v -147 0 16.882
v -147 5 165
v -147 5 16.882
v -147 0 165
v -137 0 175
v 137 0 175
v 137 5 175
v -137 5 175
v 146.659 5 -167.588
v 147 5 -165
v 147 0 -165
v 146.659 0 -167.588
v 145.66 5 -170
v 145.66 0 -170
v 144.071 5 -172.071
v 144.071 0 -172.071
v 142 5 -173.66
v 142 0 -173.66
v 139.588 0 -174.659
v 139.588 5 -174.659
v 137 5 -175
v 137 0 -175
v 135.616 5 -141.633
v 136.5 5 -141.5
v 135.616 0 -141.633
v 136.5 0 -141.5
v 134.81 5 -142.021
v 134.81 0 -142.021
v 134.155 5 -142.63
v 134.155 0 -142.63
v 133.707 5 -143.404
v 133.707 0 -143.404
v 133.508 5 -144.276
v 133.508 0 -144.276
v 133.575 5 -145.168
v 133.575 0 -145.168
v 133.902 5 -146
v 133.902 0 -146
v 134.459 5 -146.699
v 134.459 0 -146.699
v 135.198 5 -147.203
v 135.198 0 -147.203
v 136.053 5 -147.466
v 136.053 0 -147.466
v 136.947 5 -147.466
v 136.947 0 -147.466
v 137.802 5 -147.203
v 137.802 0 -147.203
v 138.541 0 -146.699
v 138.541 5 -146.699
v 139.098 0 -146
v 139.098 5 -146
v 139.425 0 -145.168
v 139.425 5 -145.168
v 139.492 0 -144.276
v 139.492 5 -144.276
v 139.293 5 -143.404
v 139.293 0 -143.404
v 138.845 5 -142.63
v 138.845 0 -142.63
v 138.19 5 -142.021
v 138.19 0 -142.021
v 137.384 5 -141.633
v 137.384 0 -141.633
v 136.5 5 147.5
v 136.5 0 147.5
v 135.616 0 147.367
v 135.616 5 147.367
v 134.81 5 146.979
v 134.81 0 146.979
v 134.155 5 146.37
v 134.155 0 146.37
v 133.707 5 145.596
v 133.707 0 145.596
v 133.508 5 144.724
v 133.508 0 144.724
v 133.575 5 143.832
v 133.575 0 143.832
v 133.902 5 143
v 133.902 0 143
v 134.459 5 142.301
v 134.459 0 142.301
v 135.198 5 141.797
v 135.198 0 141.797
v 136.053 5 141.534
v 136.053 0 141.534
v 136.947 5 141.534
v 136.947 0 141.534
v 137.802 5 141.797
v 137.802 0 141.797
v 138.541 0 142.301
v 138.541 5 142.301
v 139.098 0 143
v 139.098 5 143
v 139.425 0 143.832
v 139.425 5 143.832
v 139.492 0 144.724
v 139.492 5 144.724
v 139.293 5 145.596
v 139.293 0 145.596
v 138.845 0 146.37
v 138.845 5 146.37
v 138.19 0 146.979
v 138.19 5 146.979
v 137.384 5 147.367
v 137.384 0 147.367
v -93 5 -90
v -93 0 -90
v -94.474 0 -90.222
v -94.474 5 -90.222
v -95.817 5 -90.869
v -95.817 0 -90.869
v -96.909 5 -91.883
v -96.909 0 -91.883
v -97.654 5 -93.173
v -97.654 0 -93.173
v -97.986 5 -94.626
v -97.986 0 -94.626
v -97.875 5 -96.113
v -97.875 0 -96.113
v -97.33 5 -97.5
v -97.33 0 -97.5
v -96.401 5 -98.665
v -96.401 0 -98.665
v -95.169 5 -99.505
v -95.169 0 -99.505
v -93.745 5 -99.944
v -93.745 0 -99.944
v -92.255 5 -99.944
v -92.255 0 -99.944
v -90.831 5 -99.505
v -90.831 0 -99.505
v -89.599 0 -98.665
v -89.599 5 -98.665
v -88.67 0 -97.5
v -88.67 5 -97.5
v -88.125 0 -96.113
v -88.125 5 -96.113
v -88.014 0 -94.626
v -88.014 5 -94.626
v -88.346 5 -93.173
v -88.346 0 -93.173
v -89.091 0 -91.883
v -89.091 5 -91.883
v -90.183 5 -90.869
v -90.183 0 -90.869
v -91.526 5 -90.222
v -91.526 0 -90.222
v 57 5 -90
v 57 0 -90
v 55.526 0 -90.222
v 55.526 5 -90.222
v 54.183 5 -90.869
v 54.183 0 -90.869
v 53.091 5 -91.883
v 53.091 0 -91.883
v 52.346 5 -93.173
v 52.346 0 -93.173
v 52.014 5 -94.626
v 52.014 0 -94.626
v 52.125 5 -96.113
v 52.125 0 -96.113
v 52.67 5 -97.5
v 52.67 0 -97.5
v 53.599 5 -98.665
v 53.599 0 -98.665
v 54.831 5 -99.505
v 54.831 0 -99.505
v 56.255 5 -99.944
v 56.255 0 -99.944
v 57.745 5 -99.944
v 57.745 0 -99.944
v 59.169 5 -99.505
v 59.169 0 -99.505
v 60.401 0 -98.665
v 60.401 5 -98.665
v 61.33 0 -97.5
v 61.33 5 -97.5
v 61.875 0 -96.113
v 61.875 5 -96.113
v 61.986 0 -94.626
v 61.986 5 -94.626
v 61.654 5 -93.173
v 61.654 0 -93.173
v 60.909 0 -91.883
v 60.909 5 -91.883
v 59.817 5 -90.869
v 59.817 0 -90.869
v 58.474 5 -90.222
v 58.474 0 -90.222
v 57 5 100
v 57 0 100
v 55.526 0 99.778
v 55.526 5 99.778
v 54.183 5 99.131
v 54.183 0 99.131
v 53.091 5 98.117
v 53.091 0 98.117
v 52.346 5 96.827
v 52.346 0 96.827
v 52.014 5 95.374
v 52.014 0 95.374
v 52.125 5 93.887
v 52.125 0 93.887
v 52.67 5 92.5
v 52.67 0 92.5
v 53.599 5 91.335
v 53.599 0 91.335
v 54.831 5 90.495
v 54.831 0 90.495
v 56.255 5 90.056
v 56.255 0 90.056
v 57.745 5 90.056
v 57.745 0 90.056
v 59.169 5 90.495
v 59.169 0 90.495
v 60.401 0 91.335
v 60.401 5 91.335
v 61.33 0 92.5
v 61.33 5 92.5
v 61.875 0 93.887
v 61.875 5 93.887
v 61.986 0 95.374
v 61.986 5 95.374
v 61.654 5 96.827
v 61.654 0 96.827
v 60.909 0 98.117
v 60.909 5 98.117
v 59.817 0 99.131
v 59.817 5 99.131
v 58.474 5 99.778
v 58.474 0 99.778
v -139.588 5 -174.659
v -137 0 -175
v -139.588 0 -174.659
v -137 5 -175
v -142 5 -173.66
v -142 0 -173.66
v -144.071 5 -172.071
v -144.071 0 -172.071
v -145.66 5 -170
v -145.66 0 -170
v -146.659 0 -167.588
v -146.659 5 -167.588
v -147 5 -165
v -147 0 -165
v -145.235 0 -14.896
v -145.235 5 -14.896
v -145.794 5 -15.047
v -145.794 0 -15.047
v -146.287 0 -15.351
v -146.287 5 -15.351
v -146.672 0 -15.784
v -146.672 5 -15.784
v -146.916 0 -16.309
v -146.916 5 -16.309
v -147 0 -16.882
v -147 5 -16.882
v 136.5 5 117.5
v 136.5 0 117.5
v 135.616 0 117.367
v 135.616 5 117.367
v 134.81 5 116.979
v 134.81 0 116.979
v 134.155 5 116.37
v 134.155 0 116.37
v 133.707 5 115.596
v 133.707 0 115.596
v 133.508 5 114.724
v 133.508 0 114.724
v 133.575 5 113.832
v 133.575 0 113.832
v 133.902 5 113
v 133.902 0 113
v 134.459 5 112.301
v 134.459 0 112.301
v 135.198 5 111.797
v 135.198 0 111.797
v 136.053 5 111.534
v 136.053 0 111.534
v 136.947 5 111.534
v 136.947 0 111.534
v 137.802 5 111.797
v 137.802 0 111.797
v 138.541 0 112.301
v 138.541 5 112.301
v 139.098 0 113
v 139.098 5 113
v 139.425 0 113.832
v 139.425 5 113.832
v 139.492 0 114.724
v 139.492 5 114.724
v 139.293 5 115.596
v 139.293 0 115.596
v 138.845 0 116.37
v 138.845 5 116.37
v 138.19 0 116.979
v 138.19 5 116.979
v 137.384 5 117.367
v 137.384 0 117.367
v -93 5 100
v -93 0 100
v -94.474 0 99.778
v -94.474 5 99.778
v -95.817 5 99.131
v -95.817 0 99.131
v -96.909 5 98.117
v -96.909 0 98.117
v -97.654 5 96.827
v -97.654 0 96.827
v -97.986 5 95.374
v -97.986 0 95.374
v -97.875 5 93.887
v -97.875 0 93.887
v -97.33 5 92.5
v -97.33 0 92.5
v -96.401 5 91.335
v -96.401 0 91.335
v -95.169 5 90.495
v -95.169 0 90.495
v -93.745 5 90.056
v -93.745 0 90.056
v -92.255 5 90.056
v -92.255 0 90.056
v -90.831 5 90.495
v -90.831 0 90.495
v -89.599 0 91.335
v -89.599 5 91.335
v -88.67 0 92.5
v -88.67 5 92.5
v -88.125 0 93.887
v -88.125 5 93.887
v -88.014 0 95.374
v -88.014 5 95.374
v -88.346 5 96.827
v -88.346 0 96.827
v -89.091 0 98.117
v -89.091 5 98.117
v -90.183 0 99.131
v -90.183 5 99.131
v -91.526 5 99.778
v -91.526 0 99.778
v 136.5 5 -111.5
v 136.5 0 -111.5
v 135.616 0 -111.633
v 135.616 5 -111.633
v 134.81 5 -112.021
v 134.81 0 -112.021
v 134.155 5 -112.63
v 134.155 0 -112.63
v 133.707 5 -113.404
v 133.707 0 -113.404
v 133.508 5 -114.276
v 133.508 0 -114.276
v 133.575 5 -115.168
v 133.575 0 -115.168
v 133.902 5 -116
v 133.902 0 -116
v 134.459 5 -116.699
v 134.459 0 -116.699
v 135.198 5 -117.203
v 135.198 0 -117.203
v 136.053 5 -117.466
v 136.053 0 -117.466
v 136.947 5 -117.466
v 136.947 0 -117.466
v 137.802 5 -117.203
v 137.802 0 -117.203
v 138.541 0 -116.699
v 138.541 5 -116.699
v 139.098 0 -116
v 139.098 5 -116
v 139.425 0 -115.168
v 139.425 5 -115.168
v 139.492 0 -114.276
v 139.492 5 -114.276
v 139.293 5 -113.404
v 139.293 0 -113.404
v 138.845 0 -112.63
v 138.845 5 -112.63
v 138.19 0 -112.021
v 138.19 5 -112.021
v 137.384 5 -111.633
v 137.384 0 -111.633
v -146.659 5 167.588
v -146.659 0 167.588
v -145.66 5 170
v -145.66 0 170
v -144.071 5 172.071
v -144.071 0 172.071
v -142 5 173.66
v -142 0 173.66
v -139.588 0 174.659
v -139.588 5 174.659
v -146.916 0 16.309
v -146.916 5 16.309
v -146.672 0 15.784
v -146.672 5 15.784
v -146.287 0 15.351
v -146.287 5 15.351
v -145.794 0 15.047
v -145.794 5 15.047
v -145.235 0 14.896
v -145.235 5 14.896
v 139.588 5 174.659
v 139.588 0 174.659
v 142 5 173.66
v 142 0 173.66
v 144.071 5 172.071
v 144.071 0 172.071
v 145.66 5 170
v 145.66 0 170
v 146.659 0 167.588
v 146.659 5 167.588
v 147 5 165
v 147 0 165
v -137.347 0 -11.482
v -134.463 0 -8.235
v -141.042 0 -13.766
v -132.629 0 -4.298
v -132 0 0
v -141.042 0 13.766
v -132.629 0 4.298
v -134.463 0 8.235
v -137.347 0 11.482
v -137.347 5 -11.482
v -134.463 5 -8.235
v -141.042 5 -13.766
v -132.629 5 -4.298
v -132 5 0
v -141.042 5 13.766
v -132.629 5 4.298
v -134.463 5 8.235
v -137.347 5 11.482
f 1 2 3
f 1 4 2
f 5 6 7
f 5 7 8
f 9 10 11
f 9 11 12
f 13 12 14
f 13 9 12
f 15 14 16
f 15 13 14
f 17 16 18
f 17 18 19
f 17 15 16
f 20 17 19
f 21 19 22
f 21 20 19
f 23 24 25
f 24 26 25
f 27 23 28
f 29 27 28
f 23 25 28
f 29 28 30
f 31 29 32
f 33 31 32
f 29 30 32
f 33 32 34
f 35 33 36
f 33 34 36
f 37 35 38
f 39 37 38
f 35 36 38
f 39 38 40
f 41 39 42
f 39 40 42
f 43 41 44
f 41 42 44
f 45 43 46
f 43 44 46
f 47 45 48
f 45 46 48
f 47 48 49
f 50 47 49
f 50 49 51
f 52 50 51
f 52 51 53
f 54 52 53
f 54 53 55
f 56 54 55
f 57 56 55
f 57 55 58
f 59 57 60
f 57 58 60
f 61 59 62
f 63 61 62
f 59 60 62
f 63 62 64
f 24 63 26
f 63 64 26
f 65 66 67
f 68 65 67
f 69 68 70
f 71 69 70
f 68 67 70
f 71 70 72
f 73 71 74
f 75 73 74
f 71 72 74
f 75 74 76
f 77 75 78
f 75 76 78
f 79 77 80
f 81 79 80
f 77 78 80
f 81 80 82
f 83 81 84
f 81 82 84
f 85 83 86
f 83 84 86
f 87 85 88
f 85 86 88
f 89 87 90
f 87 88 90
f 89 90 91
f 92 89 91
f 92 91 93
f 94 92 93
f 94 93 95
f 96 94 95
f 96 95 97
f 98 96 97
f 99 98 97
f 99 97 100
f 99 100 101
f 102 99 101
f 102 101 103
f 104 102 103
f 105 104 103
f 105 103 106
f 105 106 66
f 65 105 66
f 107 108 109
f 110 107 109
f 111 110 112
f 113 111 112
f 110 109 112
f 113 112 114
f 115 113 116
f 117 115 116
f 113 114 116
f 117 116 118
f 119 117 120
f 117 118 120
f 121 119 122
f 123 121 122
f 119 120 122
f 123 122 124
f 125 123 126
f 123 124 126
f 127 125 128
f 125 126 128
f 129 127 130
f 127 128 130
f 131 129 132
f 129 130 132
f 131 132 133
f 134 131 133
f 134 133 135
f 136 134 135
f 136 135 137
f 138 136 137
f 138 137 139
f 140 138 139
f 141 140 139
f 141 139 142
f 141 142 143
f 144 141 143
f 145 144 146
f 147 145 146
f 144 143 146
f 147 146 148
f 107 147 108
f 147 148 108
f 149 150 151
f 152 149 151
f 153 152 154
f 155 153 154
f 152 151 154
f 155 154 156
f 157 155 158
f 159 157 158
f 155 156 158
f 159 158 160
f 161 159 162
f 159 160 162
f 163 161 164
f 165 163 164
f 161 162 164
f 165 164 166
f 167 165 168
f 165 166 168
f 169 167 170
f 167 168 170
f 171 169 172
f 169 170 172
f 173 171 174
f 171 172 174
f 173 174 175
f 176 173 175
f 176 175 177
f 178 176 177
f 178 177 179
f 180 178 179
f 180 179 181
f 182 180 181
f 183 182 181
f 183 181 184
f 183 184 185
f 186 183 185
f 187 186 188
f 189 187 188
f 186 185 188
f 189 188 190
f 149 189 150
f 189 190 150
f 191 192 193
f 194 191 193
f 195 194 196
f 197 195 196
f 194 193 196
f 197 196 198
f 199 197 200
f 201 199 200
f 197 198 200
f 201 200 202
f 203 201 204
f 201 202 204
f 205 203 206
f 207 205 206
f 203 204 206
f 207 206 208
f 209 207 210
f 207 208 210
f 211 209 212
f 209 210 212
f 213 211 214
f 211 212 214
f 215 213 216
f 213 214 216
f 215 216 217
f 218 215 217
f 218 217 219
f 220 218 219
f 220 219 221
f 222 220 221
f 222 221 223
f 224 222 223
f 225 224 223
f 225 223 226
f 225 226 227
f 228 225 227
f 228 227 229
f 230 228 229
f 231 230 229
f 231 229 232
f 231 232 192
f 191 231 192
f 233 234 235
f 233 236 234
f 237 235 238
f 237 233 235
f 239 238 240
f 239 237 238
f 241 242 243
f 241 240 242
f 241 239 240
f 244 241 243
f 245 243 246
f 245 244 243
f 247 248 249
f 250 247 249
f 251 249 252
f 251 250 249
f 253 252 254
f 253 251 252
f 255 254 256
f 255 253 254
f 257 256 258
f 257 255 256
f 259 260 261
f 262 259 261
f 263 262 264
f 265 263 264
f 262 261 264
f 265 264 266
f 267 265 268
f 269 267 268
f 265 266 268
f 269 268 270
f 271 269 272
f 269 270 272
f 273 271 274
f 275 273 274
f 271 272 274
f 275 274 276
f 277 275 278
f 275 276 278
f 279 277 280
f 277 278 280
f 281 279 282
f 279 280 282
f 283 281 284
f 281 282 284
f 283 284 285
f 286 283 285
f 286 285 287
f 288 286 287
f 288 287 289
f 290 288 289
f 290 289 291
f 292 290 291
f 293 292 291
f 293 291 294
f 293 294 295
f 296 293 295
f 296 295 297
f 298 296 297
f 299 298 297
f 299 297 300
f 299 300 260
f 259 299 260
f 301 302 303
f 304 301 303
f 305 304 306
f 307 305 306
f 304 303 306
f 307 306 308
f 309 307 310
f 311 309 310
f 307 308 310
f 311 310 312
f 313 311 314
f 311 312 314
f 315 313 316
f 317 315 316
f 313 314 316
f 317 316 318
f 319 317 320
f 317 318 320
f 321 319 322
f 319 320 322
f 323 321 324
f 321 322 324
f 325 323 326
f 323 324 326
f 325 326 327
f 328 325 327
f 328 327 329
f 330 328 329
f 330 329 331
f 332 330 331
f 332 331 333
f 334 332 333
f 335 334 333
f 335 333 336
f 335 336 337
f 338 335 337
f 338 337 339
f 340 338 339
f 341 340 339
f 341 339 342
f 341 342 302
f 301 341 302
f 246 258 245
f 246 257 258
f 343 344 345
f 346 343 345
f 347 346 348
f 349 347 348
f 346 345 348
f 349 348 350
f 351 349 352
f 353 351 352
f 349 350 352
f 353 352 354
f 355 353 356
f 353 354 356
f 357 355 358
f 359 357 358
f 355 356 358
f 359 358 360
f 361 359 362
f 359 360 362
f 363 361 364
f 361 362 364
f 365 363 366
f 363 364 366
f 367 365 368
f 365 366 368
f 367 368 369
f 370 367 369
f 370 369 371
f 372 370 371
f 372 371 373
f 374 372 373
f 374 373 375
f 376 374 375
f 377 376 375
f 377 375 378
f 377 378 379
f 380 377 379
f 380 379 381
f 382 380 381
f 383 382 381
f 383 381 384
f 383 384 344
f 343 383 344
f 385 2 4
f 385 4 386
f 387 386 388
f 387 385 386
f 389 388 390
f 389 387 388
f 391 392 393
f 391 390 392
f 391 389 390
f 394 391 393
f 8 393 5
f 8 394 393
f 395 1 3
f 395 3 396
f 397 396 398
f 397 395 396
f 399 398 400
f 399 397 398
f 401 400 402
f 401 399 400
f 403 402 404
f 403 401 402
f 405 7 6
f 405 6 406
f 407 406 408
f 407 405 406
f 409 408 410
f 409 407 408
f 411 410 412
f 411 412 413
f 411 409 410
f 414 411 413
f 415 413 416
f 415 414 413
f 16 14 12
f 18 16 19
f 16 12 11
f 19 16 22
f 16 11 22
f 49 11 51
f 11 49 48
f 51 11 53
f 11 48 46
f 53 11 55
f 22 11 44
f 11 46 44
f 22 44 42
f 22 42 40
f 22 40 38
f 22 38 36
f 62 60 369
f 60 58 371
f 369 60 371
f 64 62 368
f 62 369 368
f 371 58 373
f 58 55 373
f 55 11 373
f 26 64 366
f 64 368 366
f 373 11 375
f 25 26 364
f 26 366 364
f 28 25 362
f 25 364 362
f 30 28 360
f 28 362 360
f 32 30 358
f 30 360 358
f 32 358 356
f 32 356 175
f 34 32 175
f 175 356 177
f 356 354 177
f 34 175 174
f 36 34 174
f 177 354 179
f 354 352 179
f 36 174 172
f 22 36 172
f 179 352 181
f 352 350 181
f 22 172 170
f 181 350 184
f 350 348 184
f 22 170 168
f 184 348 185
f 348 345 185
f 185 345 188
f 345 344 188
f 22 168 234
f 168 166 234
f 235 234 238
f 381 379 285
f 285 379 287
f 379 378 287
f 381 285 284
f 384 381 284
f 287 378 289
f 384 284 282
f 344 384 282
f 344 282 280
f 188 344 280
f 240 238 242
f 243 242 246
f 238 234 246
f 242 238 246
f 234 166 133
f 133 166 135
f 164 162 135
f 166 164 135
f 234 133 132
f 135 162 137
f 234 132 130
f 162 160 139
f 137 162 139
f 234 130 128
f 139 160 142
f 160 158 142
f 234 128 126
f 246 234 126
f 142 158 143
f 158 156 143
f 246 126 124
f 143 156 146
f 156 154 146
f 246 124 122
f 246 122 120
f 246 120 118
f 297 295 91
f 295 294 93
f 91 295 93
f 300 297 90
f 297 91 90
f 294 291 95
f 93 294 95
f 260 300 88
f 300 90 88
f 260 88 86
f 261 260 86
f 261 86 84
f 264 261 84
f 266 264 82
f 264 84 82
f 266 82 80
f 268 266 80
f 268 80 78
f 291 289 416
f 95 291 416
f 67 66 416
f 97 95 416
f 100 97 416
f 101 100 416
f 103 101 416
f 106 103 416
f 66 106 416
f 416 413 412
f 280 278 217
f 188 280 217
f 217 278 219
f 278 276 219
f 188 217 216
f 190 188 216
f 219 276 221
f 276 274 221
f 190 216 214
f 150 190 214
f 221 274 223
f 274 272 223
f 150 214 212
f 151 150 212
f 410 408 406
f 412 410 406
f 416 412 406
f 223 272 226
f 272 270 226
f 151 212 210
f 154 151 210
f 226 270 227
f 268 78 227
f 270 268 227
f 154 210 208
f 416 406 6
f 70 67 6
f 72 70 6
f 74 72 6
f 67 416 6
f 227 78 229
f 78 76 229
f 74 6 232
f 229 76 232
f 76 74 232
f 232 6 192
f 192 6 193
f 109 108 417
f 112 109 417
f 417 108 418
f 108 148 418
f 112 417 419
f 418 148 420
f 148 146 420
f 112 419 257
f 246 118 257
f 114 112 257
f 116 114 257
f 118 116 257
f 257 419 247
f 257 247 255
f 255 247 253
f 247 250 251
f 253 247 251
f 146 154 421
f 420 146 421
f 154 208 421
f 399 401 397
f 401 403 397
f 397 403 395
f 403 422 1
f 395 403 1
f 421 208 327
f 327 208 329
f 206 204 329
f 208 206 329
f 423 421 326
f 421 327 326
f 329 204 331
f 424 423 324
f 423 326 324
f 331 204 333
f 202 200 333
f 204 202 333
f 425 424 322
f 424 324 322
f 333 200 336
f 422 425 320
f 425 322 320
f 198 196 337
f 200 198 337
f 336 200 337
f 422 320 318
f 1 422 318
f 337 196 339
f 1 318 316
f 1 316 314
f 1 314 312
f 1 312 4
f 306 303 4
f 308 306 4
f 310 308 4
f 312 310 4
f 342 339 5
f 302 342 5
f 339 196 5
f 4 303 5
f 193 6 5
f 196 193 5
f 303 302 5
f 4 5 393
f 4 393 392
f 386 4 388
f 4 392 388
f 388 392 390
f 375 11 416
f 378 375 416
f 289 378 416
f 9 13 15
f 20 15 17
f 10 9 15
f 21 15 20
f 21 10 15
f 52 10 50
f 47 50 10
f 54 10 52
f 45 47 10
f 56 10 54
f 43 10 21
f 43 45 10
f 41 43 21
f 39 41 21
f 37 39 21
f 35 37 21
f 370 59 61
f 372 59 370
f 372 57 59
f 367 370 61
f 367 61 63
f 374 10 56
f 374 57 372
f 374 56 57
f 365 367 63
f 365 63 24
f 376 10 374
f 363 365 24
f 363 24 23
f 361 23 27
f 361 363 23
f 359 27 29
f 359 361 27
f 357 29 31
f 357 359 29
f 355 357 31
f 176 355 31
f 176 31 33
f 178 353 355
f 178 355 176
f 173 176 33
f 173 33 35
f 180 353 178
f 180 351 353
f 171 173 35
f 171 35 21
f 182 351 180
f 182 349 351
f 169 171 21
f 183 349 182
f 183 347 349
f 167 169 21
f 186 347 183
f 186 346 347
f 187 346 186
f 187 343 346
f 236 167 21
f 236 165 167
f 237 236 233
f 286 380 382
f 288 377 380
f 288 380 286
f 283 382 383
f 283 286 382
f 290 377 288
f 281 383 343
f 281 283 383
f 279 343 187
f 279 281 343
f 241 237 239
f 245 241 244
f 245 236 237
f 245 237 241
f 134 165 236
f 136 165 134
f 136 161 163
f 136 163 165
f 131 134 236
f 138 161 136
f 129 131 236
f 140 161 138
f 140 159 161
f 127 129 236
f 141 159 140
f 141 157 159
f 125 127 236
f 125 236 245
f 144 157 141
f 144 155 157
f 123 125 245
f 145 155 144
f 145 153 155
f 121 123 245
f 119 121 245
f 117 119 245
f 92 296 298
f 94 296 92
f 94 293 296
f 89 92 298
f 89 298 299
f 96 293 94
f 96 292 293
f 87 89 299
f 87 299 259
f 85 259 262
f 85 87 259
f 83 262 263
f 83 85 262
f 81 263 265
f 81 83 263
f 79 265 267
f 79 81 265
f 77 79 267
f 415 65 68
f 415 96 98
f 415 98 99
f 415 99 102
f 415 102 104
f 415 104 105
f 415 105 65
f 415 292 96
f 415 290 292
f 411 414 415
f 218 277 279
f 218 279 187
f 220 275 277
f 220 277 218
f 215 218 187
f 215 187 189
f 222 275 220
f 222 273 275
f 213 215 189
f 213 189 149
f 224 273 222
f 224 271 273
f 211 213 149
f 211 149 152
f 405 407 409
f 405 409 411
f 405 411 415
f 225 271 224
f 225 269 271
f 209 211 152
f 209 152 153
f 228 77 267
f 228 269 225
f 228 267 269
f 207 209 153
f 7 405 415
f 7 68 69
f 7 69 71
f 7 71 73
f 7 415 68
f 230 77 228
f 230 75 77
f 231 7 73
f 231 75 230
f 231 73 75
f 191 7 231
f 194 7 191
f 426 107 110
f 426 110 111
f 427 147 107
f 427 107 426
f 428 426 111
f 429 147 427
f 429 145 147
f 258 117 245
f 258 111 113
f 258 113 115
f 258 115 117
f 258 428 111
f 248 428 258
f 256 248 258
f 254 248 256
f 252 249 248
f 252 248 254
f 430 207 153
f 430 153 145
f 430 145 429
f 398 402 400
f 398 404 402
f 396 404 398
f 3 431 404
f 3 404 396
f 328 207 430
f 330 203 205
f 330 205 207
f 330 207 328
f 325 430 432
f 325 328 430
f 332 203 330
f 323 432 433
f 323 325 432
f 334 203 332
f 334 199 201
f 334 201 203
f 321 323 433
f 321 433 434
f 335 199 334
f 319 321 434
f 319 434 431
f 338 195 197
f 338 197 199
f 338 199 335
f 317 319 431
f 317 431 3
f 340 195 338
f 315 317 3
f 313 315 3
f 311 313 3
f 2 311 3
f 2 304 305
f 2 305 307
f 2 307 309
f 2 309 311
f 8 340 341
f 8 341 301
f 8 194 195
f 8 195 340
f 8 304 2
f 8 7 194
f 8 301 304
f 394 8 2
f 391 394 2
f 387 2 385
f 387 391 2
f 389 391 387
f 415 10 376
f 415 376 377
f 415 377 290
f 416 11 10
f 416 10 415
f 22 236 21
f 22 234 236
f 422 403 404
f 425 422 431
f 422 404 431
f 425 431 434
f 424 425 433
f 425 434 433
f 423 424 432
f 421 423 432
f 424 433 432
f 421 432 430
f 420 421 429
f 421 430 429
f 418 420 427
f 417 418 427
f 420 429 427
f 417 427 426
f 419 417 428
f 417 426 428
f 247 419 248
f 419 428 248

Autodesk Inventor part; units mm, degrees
ref_plane "YZ Plane" through (0, 0, 0) normal (1, 0, 0) x (0, 1, 0)
ref_plane "XZ Plane" through (0, 0, 0) normal (0, 1, 0) x (-1, 0, 0)
ref_plane "XY Plane" through (0, 0, 0) normal (0, 0, 1) x (1, 0, 0)
sketch "草圖1" plane through (0, 0, 0) normal (0, 1, 0) x (-1, 0, 0)
  line L0 (-147, 175) -> (147, 175)
  line L1 (147, 175) -> (147, -175)
  line L2 (147, -175) -> (-147, -175)
  line L3 (-147, -175) -> (-147, 175)
  line L4 (-147, 175) -> (147, -175) construction
  line L5 (147, 175) -> (-147, -175) construction
  point P0 (0, 0)
  dimension "d0" = 294
  dimension "d1" = 350
extrude "擠出1" add sketch "草圖1" along normal blind 5
sketch "草圖2" plane through (0, 5, 0) normal (0, 1, 0) x (1, 0, 0)
  line L0 (147, -175) -> (147, 175) projected
  line L1 (136.5, -114.5) -> (136.5, 114.5) construction
  point P0 (0, 0)
  point P1 (136.5, -144.5)
  point P2 (136.5, 144.5)
  point P3 (136.5, 0)
  point P4 (147, 0)
  dimension "d4" = 30
  dimension "d5" = 30
  dimension "d6" = 10.5
  dimension "d7" = 229
hole "孔1" at (136.5, 5, 144.5) at (136.5, 5, 114.5) at (136.5, 5, -114.5) at (136.5, 5, -144.5) direction (0, -1, 0) diameter 6 end through all
fillet "圓角1" radius 10 4 edges at (-147, 2.5, 175) (-147, 2.5, -175) (147, 2.5, 175) (147, 2.5, -175)
sketch "草圖4" plane through (0, 5, 0) normal (0, 1, 0) x (1, 0, 0)
  line L0 (-93, -95) -> (57, -95)
  line L1 (57, -95) -> (57, 95)
  line L2 (57, 95) -> (-93, 95)
  line L3 (-93, 95) -> (-93, -95)
  line L4 (-147, 165) -> (-147, -165) projected
  point P0 (0, 0)
  point P1 (-93, 0)
  dimension "d22" = 54
  dimension "d23" = 190
  dimension "d24" = 150
hole "孔2" at (-93, 5, 95) at (57, 5, 95) at (57, 5, -95) at (-93, 5, -95) direction (0, -1, 0) diameter 10 end through all
sketch "草圖5" plane through (0, 5, 0) normal (0, 1, 0) x (1, 0, 0)
  line L0 (-147, 165) -> (-147, -165) projected
  circle A0 centre (-147, 0) radius 15
  point P0 (0, 0)
  point P1 (-147, 15)
  point P2 (-147, -15)
  dimension "d32" = 30
extrude "擠出3" cut sketch "草圖5" against normal through all contours A0 L0 picked at (-139.9734, -4.2083)
fillet "圓角3" radius 2 2 edges at (-147, 2.5, 15) (-147, 2.5, -15)
sketch "草圖3" plane through (0, 5, 0) normal (0, 1, 0) x (1, 0, 0)
  arc A0 (-137, 175) -> (-100, 165) centre (-90, 165) ccw projected
  line L0 (-100, 165) -> (-100, -165) projected
  arc A1 (-100, -165) -> (-137, -175) centre (-90, -165) ccw projected
  line L1 (-137, -175) -> (147, -175) projected
  line L2 (100, -175) -> (100, 175) projected
  line L3 (147, 175) -> (-137, 175) projected
  circle A2 centre (89.5, 114.5) radius 3 projected
  circle A3 centre (89.5, -144.5) radius 3 projected
  circle A4 centre (89.5, -114.5) radius 3 projected
  circle A5 centre (89.5, 144.5) radius 3 projected
  line L4 (-137, -175) -> (147, -175) projected
  line L5 (147, 175) -> (-137, 175) projected
  line L6 (147, -175) -> (75, -175)
  line L7 (75, -175) -> (75, 175)
  line L8 (75, 175) -> (100, 175)
  line L9 (100, 175) -> (100, -175)
  line L10 (147, -175) -> (147, 175) projected
  line L11 (75, -154) -> (100, -154)
  line L12 (100, -154) -> (100, -105)
  line L13 (100, -105) -> (75, -105)
  line L14 (75, -105) -> (75, -154)
  line L15 (75, 105) -> (100, 105)
  line L16 (100, 105) -> (100, 154)
  line L17 (100, 154) -> (75, 154)
  line L18 (75, 154) -> (75, 105)
  circle A6 centre (136.5, -144.5) radius 3 construction
  circle A7 centre (136.5, -114.5) radius 3 construction
  line L19 (89.5, -144.5) -> (89.5, -114.5) construction
  circle A8 centre (136.5, 114.5) radius 3 construction
  circle A9 centre (136.5, 144.5) radius 3 construction
  line L20 (89.5, 114.5) -> (89.5, 144.5) construction
  point P0 (0, 0)
  point P1 (100, -129.5)
  point P2 (89.5, -129.5)
  point P3 (100, 129.5)
  point P4 (89.5, 129.5)
  dimension "d16" = 25
  dimension "d17" = 49
  dimension "d18" = 49
equation "\"d5\" = d4"
properties part number "角度桌板"
